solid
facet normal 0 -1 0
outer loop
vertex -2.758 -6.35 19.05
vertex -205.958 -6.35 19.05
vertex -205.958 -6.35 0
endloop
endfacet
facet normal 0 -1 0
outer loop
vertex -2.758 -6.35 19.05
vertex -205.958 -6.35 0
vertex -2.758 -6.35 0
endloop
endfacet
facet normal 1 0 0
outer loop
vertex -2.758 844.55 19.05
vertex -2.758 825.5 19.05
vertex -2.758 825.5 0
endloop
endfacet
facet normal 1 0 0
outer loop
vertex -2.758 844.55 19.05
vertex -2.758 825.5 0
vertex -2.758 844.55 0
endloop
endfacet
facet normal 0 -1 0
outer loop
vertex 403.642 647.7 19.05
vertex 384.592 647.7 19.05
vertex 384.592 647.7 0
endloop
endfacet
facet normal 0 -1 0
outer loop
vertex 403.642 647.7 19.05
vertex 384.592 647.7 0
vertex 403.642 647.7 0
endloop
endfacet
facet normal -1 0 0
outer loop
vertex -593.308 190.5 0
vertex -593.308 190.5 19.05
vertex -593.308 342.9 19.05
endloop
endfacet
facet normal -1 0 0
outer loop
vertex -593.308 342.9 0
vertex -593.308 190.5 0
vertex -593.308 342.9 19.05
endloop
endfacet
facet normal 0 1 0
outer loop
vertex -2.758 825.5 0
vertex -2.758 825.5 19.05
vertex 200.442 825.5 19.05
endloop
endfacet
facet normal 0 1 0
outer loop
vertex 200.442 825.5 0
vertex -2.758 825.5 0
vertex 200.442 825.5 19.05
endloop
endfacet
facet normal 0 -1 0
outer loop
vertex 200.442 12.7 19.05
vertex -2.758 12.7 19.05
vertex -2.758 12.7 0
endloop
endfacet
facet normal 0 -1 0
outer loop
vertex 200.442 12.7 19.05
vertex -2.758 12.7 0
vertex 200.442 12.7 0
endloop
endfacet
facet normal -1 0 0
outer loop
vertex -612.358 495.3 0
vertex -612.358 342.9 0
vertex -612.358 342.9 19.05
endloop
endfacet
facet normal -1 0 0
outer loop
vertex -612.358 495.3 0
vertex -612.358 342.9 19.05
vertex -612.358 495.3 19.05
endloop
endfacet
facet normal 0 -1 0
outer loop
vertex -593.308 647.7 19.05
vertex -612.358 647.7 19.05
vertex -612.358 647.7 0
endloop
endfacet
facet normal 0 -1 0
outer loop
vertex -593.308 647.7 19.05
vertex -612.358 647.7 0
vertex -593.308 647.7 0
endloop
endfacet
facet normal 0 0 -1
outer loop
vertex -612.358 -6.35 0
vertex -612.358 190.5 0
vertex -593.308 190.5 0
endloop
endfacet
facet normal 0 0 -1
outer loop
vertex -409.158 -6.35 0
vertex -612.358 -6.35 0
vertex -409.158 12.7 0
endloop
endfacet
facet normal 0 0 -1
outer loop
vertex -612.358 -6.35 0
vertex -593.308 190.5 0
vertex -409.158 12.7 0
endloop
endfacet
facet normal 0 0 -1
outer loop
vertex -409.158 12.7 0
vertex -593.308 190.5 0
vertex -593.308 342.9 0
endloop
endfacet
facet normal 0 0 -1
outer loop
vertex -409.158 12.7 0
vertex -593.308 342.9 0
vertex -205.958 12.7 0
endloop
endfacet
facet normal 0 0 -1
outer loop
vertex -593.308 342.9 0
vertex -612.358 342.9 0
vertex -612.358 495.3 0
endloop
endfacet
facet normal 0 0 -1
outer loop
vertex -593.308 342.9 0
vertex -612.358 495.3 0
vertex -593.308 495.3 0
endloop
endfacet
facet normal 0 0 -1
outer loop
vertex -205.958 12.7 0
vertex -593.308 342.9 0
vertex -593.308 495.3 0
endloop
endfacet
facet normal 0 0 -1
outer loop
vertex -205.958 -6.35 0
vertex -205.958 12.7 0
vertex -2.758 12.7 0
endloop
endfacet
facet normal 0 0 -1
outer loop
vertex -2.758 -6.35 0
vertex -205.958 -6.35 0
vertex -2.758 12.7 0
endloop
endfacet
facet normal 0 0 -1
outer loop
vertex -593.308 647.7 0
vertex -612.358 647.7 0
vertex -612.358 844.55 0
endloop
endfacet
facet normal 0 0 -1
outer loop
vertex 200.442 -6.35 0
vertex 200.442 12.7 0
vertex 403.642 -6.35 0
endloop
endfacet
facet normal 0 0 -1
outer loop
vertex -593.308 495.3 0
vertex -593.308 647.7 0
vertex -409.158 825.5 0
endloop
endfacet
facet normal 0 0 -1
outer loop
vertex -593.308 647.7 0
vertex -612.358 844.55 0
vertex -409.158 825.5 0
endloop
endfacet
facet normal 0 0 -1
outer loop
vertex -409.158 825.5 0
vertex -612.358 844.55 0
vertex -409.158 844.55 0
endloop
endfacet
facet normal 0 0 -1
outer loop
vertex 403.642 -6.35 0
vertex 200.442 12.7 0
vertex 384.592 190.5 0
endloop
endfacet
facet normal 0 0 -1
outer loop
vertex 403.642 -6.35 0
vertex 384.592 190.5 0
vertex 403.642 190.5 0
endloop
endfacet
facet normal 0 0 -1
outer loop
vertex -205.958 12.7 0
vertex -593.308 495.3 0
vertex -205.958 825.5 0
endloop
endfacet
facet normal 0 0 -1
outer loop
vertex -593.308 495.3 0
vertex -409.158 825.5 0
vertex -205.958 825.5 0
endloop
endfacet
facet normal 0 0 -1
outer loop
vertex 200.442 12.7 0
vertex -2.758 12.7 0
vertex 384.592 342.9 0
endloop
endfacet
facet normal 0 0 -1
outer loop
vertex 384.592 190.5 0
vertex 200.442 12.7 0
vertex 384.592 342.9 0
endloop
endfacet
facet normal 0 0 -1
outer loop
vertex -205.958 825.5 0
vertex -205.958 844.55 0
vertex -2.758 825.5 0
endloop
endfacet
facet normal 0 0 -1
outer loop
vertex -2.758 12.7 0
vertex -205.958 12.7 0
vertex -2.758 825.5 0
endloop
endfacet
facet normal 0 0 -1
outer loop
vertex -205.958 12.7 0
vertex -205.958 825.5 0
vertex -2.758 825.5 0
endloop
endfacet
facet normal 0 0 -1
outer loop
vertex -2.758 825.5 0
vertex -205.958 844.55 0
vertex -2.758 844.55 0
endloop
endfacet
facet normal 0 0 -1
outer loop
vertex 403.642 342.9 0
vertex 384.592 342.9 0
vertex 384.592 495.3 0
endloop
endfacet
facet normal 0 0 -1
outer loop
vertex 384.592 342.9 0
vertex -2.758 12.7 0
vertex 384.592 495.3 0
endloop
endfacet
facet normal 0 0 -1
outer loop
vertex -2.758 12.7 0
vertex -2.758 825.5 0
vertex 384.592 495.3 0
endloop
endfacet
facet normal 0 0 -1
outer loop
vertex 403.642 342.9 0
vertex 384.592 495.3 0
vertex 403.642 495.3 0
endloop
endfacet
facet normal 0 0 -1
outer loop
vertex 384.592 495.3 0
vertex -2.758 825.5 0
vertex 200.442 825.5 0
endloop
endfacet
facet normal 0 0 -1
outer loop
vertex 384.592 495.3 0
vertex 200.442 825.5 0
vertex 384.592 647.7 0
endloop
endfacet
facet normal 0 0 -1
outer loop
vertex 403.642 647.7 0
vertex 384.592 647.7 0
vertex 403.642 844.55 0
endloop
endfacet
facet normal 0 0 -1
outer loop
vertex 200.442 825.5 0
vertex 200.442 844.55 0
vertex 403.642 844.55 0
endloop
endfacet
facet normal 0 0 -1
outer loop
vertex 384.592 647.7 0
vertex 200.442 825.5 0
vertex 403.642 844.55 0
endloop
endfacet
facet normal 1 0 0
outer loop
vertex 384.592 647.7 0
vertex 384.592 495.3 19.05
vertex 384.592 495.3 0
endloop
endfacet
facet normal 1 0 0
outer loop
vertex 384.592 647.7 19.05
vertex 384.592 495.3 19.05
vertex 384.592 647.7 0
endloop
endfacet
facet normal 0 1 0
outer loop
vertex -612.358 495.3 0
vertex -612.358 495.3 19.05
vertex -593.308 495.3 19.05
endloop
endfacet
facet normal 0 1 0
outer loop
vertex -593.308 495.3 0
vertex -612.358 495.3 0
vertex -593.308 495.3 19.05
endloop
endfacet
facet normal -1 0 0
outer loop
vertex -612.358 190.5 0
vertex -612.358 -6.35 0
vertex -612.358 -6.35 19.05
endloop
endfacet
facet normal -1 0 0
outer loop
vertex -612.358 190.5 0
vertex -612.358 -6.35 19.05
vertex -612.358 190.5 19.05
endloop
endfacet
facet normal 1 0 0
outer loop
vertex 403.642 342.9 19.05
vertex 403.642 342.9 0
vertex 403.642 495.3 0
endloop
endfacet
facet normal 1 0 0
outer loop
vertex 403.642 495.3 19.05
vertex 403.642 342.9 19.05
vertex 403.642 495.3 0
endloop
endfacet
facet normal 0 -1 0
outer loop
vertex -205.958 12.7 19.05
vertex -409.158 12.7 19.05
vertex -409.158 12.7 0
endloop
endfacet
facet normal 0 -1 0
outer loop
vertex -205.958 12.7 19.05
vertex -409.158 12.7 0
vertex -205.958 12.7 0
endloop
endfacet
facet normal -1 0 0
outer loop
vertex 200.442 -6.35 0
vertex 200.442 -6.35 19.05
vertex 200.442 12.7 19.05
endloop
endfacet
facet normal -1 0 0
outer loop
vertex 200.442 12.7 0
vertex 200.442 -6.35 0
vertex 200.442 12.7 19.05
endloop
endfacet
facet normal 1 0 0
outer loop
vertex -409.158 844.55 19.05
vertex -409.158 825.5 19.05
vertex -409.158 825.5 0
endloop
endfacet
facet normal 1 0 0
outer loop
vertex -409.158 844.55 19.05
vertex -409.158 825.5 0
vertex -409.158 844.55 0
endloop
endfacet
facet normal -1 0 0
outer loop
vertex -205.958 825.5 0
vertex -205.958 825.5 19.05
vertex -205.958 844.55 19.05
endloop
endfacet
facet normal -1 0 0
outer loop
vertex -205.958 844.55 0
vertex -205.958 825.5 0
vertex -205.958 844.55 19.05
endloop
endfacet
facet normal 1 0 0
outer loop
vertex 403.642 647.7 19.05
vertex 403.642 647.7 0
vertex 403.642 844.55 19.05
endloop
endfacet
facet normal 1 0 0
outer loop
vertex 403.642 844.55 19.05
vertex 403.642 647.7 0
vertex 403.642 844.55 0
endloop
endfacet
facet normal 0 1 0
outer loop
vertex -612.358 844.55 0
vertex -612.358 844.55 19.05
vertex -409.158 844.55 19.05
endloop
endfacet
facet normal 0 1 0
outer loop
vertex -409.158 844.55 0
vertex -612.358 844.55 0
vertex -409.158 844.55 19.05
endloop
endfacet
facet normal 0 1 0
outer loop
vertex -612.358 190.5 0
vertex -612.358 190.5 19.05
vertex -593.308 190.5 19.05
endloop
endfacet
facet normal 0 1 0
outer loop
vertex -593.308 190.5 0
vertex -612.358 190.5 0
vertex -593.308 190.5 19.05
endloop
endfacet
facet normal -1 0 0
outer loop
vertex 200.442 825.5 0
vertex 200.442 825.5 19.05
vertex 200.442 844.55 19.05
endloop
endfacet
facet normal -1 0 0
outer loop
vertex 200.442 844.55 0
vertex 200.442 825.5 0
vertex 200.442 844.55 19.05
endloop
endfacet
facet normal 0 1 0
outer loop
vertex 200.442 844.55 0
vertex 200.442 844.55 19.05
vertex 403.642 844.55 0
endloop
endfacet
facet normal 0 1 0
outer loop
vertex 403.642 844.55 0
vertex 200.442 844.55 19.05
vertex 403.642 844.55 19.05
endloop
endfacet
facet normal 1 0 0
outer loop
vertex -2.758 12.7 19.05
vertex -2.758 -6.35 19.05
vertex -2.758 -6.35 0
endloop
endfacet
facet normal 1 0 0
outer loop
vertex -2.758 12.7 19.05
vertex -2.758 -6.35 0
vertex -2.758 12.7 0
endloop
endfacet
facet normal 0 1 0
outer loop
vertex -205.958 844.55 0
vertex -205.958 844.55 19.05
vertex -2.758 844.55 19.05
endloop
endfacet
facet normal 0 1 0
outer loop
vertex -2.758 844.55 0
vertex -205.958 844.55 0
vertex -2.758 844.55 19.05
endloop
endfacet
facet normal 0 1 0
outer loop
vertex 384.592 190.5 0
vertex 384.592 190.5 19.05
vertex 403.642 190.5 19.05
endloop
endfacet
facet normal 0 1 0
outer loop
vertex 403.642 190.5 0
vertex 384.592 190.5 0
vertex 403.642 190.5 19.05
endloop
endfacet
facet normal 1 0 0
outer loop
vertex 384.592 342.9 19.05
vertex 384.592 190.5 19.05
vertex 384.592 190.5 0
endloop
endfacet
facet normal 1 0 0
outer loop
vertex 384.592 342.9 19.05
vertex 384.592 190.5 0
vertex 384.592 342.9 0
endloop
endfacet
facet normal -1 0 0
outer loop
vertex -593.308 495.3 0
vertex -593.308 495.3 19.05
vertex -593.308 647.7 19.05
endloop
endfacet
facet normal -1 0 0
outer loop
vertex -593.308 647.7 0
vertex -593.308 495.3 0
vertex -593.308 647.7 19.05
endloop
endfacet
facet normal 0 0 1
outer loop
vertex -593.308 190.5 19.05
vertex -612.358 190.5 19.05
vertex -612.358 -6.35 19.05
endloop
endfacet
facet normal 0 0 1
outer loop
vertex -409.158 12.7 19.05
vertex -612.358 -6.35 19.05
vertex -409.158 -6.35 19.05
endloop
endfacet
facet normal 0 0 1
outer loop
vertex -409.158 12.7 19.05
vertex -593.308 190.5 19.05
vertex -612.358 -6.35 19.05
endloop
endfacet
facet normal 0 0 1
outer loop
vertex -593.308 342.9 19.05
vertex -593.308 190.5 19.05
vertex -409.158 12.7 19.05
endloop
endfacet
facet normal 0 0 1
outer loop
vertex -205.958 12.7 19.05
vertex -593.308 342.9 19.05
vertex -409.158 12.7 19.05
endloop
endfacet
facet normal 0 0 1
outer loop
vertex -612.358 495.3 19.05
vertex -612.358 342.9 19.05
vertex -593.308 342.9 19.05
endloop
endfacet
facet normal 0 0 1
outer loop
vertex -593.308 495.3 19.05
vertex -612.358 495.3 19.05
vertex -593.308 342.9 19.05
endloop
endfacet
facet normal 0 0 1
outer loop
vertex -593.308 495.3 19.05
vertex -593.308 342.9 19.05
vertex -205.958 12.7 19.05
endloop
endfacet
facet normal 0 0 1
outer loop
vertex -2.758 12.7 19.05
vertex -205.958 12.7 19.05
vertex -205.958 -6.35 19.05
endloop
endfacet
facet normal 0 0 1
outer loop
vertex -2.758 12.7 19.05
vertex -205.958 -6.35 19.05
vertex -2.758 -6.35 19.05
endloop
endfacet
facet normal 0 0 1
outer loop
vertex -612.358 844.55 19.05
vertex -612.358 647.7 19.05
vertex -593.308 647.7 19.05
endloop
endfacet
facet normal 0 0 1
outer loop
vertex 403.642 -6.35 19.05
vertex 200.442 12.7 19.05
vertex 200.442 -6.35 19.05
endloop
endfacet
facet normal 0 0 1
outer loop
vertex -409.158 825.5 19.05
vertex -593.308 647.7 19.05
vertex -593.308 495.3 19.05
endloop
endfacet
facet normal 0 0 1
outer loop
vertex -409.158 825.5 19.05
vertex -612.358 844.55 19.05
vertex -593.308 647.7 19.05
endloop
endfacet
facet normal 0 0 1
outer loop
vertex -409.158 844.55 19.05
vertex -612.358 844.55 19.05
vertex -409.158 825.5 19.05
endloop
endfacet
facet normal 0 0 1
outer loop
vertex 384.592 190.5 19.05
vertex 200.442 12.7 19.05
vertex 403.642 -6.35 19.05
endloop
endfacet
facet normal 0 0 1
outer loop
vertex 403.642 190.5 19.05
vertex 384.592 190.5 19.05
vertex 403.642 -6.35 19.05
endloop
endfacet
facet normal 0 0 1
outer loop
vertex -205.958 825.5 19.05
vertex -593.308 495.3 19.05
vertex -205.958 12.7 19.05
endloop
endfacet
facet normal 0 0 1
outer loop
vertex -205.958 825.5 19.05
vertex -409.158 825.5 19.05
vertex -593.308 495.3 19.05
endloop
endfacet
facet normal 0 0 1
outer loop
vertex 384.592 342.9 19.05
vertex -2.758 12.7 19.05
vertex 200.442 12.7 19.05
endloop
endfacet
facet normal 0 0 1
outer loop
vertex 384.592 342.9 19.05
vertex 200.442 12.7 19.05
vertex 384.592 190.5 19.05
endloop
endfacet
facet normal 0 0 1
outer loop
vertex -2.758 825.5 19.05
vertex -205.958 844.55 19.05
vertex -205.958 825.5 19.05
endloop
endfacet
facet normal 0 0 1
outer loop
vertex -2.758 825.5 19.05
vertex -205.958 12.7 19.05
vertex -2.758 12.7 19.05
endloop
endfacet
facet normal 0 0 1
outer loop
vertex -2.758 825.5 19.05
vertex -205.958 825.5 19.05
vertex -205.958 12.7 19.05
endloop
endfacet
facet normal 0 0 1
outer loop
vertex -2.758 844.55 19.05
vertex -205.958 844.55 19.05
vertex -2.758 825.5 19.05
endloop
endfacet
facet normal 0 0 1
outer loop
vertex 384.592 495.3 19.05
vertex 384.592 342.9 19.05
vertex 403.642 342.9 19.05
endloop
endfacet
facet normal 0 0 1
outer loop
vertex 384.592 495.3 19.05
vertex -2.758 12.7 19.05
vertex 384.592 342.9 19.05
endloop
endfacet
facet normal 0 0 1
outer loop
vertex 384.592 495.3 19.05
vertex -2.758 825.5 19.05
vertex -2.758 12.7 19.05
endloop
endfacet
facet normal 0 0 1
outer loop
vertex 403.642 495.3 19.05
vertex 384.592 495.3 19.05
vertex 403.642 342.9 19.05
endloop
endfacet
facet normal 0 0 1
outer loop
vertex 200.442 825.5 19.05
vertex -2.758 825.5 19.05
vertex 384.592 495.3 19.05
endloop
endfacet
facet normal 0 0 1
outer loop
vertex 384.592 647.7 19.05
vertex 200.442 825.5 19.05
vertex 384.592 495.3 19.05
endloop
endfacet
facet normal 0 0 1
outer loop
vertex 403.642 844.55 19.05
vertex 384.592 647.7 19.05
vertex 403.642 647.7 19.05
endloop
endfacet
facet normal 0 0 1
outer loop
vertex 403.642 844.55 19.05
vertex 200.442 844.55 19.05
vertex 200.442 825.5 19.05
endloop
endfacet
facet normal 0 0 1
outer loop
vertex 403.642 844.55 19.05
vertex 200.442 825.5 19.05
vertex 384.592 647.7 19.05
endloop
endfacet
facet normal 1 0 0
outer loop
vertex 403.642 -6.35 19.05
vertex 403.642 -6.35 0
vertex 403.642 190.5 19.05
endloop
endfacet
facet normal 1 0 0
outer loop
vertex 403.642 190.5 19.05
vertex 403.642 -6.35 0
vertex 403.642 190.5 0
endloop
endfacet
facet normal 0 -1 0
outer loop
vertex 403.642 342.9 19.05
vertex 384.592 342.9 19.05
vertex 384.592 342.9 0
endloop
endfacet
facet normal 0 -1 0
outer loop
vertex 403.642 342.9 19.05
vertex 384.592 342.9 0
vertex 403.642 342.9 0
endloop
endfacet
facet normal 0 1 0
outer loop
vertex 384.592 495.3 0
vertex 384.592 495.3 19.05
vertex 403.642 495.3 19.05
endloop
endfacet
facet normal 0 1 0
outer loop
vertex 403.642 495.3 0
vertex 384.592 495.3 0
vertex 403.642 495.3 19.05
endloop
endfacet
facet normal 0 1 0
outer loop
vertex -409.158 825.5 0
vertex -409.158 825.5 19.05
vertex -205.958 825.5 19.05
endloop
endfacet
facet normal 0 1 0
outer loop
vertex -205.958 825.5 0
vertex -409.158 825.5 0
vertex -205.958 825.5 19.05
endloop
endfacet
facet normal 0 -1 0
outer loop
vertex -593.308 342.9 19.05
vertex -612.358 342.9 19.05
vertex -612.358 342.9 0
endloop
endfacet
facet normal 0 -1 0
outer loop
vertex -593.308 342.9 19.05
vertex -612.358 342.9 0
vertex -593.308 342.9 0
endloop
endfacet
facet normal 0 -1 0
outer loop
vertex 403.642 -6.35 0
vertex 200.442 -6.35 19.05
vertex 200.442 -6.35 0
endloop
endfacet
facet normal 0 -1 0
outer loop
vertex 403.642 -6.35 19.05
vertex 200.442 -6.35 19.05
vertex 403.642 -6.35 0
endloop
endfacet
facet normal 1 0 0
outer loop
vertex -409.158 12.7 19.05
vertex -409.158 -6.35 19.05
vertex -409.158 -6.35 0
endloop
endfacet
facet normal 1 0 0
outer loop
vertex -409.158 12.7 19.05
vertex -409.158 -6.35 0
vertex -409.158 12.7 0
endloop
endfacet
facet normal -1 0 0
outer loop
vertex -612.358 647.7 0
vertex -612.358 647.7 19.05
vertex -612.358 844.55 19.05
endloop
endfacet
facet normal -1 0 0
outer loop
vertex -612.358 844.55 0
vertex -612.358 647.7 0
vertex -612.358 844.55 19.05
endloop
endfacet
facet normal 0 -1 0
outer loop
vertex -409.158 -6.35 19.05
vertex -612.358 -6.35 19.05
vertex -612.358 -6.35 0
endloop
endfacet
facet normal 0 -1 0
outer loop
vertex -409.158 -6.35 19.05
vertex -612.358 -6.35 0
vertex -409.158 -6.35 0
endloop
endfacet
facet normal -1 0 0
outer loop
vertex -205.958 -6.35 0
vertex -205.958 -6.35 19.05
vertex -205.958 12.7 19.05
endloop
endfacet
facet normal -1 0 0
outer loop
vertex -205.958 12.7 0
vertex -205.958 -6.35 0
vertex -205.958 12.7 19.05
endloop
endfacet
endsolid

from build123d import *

# Parameters (mm, degrees)
F0_W     = 1016
F0_H     = 838.2
F1_DEPTH = 19.05
F2_W     = 12.7
F2_H     = 152.4
F2_W_2   = 19.05
F2_W_3   = 203.2
F2_H_2   = 19.05
F3_DEPTH = 19.051
F4_W     = 203.2
F4_H     = 6.35
F4_W_2   = 6.35
F4_H_2   = 152.4
F5_DEPTH = 19.05
F6_W     = 6.35
F6_H     = 152.4
F7_DEPTH = 19.051


with BuildPart() as f1:
    # F0 (on Top) → F1 (new body)
    with BuildSketch(Plane.XY):
        with Locations((-104.35828, 419.1)):
            Rectangle(F0_W, F0_H)
    extrude(amount=F1_DEPTH)

    # F2 (on face) → F3 (cut, through all)
    with BuildSketch(Plane.XY.offset(19.05)):
        with Locations((397.29172, 266.7)):
            Rectangle(F2_W, F2_H)
        with Locations((394.11672, 571.5)):
            Rectangle(F2_W_2, F2_H)
        with Locations((-606.00828, 266.7)):
            Rectangle(F2_W, F2_H)
        with Locations((-606.00828, 571.5)):
            Rectangle(F2_W, F2_H)
        with Locations((-307.55828, 9.525)):
            Rectangle(F2_W_3, F2_H_2)
        with Locations((98.84172, 9.525)):
            Rectangle(F2_W_3, F2_H_2)
        with Locations((98.84172, 828.675)):
            Rectangle(F2_W_3, F2_H_2)
        with Locations((-307.55828, 828.675)):
            Rectangle(F2_W_3, F2_H_2)
    extrude(amount=-F3_DEPTH, mode=Mode.SUBTRACT)

    # F4 (on face) → F5 (join)
    with BuildSketch(Plane.XY.offset(19.05)):
        with Locations((-510.75828, 841.375)):
            Rectangle(F4_W, F4_H)
        with Locations((98.84172, 822.325)):
            Rectangle(F4_W, F4_H)
        with Locations((-307.55828, 822.325)):
            Rectangle(F4_W, F4_H)
        with Locations((-104.35828, 841.375)):
            Rectangle(F4_W, F4_H)
        with Locations((302.04172, 841.375)):
            Rectangle(F4_W, F4_H)
        with Locations((-307.55828, 15.875)):
            Rectangle(F4_W, F4_H)
        with Locations((-510.75828, -3.175)):
            Rectangle(F4_W, F4_H)
        with Locations((98.84172, 15.875)):
            Rectangle(F4_W, F4_H)
        with Locations((302.04172, -3.175)):
            Rectangle(F4_W, F4_H)
        with Locations((-104.35828, -3.175)):
            Rectangle(F4_W, F4_H)
        with Locations((-596.48328, 266.7)):
            Rectangle(F4_W_2, F4_H_2)
        with Locations((-596.48328, 571.5)):
            Rectangle(F4_W_2, F4_H_2)
        with Locations((387.76672, 266.7)):
            Rectangle(F4_W_2, F4_H_2)
        with Locations((381.41672, 571.5)):
            Rectangle(F4_W_2, F4_H_2)
    extrude(amount=-F5_DEPTH)

    # F6 (on face) → F7 (cut, through all)
    with BuildSketch(Plane.XY.offset(19.05)):
        with Locations((-596.48328, 571.5)):
            Rectangle(F6_W, F6_H)
        with Locations((-596.48328, 266.7)):
            Rectangle(F6_W, F6_H)
        with Locations((387.76672, 266.7)):
            Rectangle(F6_W, F6_H)
        with Locations((387.76672, 571.5)):
            Rectangle(F6_W, F6_H)
    extrude(amount=-F7_DEPTH, mode=Mode.SUBTRACT)


solid = f1.part
